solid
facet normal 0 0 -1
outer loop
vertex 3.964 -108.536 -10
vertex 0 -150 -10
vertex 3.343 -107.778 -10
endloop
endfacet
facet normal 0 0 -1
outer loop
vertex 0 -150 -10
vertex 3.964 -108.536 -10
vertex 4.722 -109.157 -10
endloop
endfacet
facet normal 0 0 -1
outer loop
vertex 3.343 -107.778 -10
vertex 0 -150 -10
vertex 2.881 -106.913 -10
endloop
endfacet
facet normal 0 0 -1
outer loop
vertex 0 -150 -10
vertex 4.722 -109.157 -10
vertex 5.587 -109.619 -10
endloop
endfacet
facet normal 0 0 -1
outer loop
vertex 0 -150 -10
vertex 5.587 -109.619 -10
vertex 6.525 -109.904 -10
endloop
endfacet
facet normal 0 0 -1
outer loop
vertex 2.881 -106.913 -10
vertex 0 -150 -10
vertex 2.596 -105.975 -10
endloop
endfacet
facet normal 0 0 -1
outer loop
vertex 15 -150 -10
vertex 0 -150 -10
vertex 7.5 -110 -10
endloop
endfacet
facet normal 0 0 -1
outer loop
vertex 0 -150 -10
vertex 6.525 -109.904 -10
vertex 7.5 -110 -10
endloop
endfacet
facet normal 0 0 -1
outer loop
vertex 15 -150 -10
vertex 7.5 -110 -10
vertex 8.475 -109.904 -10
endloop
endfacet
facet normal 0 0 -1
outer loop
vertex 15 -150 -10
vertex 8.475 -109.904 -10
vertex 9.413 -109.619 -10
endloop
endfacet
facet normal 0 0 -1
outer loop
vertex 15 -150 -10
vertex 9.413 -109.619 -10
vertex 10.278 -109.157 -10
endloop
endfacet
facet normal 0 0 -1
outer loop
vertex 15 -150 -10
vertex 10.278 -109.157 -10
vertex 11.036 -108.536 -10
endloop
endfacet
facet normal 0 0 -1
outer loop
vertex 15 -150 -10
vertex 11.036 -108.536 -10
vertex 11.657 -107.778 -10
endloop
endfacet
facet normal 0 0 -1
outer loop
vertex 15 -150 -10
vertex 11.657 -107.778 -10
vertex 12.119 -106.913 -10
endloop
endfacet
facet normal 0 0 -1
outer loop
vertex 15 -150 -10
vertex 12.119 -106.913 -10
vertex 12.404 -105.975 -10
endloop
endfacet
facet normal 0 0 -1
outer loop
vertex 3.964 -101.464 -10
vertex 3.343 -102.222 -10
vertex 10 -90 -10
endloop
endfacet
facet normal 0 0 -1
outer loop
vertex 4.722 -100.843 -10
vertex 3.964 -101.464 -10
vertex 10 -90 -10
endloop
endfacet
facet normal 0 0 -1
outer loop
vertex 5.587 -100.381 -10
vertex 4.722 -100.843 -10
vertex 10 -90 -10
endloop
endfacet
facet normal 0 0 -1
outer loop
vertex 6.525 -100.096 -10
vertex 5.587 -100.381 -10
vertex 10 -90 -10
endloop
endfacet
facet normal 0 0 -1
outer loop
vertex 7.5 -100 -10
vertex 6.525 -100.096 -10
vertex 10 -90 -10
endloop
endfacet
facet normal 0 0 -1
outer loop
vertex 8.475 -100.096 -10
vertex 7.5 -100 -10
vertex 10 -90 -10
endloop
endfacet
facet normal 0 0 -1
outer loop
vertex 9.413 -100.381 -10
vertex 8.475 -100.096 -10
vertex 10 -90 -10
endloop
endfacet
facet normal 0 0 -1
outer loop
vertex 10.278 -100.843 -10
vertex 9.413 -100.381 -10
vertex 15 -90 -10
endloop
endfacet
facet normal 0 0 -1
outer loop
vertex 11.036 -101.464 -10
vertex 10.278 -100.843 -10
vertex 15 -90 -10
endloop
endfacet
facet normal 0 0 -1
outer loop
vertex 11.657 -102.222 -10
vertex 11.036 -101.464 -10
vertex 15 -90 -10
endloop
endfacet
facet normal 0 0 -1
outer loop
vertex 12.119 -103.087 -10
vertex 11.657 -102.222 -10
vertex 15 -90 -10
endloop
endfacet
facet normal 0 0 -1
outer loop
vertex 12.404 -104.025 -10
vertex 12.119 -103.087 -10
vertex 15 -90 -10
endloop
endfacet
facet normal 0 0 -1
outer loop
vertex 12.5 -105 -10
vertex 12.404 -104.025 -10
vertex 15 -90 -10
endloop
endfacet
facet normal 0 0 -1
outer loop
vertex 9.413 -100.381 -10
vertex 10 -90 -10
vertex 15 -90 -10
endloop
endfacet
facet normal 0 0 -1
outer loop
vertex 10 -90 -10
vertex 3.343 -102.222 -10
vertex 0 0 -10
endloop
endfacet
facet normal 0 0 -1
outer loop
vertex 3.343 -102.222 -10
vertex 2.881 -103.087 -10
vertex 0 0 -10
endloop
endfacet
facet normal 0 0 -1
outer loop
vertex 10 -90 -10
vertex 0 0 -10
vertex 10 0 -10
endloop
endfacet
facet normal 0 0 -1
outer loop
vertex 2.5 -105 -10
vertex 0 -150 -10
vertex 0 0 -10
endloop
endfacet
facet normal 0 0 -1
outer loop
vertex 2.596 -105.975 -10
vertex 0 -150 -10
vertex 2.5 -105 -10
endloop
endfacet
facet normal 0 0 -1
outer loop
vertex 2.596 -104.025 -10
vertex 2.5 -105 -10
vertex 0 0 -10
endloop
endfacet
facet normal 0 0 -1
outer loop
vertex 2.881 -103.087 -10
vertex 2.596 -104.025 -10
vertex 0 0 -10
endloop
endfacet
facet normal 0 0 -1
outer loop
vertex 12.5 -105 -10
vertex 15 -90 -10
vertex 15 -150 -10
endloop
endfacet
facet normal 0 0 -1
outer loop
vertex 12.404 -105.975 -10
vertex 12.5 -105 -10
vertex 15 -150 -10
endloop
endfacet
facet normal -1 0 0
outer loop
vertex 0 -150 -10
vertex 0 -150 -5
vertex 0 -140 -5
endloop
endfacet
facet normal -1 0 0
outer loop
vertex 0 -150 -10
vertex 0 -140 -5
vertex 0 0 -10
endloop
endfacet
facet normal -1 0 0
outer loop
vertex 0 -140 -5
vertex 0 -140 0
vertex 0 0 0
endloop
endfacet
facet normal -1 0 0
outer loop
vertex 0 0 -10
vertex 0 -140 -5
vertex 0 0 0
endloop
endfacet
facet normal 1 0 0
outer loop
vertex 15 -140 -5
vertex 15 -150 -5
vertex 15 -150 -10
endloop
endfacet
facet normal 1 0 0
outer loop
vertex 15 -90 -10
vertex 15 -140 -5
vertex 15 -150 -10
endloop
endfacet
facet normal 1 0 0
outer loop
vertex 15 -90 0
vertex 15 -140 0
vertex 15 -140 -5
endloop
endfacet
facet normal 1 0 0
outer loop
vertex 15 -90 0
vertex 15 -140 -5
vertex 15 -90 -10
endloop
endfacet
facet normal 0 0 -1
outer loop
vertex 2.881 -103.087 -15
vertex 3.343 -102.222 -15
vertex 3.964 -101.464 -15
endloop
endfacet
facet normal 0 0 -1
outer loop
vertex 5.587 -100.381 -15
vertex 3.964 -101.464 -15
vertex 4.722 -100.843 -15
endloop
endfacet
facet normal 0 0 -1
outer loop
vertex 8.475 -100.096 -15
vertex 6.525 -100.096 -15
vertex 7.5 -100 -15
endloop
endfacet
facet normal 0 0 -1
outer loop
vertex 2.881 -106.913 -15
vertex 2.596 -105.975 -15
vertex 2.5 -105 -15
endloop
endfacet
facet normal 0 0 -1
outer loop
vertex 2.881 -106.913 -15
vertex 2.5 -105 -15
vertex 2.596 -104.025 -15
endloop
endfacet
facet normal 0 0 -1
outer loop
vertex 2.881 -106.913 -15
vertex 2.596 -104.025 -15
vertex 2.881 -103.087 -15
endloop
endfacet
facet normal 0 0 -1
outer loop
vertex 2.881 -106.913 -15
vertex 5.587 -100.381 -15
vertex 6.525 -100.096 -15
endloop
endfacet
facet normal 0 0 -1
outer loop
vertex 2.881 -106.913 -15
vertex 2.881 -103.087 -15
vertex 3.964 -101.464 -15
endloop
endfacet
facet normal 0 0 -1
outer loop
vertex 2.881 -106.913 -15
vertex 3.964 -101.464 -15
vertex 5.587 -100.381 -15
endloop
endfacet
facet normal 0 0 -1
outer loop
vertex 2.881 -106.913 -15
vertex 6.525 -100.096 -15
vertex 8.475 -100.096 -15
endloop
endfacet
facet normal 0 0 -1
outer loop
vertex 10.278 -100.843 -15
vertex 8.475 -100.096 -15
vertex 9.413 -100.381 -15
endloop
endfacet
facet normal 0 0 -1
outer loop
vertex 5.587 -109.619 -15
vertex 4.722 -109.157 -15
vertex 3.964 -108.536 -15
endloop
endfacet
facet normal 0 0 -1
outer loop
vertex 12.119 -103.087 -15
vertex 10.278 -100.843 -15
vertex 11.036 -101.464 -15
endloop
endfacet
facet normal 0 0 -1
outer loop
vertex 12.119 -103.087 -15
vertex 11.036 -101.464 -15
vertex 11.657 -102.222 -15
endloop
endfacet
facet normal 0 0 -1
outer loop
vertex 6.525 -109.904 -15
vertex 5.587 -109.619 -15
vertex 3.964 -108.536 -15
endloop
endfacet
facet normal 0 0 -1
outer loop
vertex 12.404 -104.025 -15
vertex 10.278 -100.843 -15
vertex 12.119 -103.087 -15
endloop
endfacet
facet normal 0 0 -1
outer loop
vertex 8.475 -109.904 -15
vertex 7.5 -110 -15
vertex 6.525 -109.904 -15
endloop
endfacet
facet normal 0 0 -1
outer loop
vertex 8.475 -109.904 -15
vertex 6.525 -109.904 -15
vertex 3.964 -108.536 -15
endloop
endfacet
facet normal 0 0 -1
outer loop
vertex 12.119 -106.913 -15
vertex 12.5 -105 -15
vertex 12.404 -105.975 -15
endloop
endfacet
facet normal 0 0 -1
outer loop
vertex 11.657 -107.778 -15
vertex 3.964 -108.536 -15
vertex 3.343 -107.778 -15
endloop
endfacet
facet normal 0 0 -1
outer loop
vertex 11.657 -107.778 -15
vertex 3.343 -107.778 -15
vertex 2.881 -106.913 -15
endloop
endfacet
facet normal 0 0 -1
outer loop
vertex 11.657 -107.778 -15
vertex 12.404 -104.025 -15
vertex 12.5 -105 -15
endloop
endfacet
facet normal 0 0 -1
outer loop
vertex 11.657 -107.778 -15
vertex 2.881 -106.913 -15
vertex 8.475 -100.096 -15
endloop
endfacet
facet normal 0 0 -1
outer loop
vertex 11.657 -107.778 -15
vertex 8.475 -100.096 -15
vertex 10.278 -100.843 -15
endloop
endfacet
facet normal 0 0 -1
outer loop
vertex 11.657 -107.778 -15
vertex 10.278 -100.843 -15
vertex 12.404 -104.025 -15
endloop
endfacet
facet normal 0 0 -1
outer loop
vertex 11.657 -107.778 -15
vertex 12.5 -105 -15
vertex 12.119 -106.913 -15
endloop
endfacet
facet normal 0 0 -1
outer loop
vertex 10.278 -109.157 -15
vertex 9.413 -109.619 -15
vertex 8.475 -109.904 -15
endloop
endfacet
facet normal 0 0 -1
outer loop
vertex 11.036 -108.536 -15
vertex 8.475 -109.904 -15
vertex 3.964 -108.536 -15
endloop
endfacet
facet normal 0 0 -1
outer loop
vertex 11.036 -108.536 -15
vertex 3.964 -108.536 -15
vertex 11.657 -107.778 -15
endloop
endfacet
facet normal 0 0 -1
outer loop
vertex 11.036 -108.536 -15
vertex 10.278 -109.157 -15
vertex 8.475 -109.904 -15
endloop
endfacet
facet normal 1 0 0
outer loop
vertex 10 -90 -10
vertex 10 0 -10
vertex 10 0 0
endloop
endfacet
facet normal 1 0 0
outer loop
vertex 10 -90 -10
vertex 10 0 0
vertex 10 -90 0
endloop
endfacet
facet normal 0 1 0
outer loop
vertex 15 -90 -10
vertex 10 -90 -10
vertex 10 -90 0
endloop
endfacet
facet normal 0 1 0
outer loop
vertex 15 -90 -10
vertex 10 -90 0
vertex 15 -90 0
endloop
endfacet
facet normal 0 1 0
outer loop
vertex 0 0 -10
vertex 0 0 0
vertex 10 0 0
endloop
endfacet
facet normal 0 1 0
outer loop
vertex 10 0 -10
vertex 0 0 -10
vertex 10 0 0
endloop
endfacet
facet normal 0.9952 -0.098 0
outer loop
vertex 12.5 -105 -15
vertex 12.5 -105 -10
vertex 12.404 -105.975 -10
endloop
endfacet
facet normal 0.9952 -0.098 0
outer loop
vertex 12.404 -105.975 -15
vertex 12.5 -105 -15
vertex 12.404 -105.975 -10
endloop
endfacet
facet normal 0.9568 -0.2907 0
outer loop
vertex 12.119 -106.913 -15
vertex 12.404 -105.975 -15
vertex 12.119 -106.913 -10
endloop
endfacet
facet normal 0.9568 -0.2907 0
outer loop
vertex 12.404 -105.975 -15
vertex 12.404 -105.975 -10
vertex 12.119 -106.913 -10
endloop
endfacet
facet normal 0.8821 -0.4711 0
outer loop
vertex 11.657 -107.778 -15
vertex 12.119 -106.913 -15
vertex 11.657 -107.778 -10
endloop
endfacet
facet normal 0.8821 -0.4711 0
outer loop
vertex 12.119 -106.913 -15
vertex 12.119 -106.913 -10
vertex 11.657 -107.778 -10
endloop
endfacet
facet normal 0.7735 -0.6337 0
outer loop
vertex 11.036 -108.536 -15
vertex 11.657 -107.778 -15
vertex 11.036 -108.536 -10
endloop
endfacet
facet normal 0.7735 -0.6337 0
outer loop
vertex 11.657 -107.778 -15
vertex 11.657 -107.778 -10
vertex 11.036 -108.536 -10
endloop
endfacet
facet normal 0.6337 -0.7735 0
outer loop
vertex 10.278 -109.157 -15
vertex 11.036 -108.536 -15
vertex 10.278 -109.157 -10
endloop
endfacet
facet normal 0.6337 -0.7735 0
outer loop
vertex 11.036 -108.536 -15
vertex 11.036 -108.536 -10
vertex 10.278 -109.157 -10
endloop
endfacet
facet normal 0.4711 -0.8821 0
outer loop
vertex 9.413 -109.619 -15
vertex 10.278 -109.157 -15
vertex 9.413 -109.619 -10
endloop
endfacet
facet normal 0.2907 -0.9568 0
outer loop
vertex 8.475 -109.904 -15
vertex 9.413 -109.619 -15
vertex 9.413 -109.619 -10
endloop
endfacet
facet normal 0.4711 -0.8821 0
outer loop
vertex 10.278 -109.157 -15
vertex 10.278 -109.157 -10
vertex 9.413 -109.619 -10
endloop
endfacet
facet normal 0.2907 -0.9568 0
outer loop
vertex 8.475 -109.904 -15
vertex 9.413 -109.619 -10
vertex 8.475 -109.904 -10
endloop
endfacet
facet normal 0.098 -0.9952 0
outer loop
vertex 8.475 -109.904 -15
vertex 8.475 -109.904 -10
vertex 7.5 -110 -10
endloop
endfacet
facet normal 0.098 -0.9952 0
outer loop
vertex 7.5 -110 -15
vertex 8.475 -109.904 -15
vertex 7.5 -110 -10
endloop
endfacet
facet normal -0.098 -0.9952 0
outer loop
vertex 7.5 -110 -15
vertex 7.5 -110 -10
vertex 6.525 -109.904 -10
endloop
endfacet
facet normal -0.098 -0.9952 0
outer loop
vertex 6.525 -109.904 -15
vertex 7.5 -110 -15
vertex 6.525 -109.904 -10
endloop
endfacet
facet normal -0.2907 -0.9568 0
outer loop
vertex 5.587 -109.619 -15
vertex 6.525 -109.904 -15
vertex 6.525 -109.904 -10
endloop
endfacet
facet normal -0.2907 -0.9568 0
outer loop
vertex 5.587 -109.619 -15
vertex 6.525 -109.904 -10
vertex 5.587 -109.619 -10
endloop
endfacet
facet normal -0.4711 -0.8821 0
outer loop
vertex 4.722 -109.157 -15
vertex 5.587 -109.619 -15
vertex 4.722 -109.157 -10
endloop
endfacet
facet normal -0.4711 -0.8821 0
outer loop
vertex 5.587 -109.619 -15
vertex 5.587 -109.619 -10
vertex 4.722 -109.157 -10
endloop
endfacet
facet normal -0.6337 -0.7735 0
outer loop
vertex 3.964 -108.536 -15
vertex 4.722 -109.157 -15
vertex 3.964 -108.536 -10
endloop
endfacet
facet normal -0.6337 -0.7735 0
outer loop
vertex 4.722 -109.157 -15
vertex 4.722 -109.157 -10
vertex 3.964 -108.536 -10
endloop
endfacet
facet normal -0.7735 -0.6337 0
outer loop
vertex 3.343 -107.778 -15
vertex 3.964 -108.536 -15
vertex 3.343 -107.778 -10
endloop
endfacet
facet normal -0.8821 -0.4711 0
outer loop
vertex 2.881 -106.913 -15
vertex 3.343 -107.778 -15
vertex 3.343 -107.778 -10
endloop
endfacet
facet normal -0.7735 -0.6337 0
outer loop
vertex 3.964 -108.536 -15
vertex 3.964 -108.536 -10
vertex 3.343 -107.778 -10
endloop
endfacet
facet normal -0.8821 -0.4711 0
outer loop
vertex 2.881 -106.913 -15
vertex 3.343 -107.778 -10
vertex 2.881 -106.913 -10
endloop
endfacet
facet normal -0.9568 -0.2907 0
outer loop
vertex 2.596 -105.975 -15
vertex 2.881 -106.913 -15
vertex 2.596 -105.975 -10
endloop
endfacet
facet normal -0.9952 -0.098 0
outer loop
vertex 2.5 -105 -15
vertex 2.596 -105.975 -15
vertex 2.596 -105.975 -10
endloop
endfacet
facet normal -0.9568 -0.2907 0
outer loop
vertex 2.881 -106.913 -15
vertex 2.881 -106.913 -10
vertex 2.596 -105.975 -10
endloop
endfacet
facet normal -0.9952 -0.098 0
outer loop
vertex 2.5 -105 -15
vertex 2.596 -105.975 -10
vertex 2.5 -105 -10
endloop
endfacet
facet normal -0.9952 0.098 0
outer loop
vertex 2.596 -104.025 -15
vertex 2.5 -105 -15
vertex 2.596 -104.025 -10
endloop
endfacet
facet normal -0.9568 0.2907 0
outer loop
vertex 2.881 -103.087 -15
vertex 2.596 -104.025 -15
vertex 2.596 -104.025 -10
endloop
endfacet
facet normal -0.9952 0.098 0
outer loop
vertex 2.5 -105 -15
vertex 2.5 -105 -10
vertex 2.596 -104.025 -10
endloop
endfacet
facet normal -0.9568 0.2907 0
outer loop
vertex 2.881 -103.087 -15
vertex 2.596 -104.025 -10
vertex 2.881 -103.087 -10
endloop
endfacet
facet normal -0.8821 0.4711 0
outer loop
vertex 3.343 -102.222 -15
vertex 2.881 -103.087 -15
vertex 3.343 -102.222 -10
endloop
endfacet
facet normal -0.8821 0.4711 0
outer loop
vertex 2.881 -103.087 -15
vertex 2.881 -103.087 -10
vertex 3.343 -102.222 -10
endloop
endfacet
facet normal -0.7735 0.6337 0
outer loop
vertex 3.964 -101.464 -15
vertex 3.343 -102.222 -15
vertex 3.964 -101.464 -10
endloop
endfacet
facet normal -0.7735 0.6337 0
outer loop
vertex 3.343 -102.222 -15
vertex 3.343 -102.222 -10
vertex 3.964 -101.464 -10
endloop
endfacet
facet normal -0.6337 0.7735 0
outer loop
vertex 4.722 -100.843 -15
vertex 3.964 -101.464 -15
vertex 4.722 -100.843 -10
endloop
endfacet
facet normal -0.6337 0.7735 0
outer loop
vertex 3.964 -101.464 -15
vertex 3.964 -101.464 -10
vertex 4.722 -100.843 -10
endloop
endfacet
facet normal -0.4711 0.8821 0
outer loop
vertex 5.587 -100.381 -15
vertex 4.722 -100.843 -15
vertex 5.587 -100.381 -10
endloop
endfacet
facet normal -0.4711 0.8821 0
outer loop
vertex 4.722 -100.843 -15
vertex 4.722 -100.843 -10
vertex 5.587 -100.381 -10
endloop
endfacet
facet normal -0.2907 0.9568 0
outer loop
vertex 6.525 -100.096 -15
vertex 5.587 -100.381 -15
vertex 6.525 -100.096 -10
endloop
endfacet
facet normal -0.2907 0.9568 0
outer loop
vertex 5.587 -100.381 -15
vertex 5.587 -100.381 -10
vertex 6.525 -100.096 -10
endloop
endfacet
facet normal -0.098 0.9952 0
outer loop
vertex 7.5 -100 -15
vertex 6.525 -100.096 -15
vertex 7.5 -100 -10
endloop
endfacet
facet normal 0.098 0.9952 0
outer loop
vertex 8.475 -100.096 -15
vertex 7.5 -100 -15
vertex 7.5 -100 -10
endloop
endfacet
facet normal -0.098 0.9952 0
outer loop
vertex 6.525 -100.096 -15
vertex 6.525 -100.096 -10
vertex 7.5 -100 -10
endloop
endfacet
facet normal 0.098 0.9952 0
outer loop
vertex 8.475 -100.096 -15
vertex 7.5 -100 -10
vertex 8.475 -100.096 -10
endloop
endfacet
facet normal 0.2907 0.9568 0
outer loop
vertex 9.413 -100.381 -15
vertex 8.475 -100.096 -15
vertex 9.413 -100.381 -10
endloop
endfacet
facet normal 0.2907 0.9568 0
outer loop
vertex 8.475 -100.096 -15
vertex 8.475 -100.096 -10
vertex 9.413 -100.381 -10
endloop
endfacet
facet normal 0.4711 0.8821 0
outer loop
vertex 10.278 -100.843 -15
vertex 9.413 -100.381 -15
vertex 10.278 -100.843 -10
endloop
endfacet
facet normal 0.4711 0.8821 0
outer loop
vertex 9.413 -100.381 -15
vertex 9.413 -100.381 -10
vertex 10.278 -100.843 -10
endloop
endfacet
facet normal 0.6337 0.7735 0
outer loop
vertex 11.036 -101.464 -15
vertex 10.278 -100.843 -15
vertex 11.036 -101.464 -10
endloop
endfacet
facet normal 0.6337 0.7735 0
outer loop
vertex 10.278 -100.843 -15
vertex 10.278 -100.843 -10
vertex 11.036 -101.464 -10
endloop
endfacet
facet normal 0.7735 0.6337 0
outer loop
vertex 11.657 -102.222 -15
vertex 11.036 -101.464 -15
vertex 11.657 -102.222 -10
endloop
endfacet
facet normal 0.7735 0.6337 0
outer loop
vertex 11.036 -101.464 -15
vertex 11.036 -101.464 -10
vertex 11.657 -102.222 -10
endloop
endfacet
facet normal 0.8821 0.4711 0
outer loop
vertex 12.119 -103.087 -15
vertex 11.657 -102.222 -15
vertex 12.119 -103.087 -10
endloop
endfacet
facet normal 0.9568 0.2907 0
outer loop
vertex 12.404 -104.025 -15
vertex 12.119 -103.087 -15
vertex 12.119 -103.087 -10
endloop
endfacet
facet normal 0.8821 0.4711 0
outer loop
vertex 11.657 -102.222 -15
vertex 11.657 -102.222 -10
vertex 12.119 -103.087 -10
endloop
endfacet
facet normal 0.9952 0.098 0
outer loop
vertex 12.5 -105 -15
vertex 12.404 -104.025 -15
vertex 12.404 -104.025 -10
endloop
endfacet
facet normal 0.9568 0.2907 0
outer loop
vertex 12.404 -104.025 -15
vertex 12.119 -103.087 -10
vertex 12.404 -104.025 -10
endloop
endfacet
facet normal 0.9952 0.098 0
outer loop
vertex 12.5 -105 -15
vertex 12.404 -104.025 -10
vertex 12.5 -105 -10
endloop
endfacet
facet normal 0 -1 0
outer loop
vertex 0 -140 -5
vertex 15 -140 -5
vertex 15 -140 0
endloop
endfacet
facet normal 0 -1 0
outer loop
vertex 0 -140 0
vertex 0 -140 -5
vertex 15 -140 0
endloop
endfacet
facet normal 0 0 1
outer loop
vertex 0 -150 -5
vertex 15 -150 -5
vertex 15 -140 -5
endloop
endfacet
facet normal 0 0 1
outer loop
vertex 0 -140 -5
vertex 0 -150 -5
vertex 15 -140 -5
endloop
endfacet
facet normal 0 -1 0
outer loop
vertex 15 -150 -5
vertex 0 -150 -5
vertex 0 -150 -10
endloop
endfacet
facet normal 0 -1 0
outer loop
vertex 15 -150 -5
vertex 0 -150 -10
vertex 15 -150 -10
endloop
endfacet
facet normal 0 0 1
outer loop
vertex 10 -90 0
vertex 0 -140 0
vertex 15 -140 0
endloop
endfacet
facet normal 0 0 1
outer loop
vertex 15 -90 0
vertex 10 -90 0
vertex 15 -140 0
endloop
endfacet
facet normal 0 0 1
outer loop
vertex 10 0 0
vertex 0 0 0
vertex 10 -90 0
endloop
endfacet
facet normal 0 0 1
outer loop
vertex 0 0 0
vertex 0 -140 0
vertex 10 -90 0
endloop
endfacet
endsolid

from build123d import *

# Parameters (mm, degrees)
F0_W     = 15
F0_H     = 150
F1_DEPTH = 10
F2_W     = 10
F2_H     = 5
F3_DEPTH = 15
F4_W     = 5
F4_H     = 90
F5_DEPTH = 10
F6_R     = 5
F7_DEPTH = 5


with BuildPart() as f1:
    # F0 (on Top) → F1 (new body)
    with BuildSketch(Plane.XY):
        with Locations((7.5, -75)):
            Rectangle(F0_W, F0_H)
    extrude(amount=-F1_DEPTH)

    # F2 (on face) → F3 (cut)
    with BuildSketch(Plane.YZ.offset(15)):
        with Locations((-145, -2.5)):
            Rectangle(F2_W, F2_H)
    extrude(amount=-F3_DEPTH, mode=Mode.SUBTRACT)

    # F4 (on face) → F5 (cut)
    with BuildSketch(Plane(origin=(0, 0, -10), x_dir=(1, 0, 0), z_dir=(0, 0, -1))):
        with Locations((12.5, 45)):
            Rectangle(F4_W, F4_H)
    extrude(amount=-F5_DEPTH, mode=Mode.SUBTRACT)

    # F6 (on face) → F7 (join)
    with BuildSketch(Plane(origin=(0, 0, -10), x_dir=(1, 0, 0), z_dir=(0, 0, -1))):
        with Locations((7.5, 105)):
            Circle(F6_R)
    extrude(amount=F7_DEPTH)


solid = f1.part
